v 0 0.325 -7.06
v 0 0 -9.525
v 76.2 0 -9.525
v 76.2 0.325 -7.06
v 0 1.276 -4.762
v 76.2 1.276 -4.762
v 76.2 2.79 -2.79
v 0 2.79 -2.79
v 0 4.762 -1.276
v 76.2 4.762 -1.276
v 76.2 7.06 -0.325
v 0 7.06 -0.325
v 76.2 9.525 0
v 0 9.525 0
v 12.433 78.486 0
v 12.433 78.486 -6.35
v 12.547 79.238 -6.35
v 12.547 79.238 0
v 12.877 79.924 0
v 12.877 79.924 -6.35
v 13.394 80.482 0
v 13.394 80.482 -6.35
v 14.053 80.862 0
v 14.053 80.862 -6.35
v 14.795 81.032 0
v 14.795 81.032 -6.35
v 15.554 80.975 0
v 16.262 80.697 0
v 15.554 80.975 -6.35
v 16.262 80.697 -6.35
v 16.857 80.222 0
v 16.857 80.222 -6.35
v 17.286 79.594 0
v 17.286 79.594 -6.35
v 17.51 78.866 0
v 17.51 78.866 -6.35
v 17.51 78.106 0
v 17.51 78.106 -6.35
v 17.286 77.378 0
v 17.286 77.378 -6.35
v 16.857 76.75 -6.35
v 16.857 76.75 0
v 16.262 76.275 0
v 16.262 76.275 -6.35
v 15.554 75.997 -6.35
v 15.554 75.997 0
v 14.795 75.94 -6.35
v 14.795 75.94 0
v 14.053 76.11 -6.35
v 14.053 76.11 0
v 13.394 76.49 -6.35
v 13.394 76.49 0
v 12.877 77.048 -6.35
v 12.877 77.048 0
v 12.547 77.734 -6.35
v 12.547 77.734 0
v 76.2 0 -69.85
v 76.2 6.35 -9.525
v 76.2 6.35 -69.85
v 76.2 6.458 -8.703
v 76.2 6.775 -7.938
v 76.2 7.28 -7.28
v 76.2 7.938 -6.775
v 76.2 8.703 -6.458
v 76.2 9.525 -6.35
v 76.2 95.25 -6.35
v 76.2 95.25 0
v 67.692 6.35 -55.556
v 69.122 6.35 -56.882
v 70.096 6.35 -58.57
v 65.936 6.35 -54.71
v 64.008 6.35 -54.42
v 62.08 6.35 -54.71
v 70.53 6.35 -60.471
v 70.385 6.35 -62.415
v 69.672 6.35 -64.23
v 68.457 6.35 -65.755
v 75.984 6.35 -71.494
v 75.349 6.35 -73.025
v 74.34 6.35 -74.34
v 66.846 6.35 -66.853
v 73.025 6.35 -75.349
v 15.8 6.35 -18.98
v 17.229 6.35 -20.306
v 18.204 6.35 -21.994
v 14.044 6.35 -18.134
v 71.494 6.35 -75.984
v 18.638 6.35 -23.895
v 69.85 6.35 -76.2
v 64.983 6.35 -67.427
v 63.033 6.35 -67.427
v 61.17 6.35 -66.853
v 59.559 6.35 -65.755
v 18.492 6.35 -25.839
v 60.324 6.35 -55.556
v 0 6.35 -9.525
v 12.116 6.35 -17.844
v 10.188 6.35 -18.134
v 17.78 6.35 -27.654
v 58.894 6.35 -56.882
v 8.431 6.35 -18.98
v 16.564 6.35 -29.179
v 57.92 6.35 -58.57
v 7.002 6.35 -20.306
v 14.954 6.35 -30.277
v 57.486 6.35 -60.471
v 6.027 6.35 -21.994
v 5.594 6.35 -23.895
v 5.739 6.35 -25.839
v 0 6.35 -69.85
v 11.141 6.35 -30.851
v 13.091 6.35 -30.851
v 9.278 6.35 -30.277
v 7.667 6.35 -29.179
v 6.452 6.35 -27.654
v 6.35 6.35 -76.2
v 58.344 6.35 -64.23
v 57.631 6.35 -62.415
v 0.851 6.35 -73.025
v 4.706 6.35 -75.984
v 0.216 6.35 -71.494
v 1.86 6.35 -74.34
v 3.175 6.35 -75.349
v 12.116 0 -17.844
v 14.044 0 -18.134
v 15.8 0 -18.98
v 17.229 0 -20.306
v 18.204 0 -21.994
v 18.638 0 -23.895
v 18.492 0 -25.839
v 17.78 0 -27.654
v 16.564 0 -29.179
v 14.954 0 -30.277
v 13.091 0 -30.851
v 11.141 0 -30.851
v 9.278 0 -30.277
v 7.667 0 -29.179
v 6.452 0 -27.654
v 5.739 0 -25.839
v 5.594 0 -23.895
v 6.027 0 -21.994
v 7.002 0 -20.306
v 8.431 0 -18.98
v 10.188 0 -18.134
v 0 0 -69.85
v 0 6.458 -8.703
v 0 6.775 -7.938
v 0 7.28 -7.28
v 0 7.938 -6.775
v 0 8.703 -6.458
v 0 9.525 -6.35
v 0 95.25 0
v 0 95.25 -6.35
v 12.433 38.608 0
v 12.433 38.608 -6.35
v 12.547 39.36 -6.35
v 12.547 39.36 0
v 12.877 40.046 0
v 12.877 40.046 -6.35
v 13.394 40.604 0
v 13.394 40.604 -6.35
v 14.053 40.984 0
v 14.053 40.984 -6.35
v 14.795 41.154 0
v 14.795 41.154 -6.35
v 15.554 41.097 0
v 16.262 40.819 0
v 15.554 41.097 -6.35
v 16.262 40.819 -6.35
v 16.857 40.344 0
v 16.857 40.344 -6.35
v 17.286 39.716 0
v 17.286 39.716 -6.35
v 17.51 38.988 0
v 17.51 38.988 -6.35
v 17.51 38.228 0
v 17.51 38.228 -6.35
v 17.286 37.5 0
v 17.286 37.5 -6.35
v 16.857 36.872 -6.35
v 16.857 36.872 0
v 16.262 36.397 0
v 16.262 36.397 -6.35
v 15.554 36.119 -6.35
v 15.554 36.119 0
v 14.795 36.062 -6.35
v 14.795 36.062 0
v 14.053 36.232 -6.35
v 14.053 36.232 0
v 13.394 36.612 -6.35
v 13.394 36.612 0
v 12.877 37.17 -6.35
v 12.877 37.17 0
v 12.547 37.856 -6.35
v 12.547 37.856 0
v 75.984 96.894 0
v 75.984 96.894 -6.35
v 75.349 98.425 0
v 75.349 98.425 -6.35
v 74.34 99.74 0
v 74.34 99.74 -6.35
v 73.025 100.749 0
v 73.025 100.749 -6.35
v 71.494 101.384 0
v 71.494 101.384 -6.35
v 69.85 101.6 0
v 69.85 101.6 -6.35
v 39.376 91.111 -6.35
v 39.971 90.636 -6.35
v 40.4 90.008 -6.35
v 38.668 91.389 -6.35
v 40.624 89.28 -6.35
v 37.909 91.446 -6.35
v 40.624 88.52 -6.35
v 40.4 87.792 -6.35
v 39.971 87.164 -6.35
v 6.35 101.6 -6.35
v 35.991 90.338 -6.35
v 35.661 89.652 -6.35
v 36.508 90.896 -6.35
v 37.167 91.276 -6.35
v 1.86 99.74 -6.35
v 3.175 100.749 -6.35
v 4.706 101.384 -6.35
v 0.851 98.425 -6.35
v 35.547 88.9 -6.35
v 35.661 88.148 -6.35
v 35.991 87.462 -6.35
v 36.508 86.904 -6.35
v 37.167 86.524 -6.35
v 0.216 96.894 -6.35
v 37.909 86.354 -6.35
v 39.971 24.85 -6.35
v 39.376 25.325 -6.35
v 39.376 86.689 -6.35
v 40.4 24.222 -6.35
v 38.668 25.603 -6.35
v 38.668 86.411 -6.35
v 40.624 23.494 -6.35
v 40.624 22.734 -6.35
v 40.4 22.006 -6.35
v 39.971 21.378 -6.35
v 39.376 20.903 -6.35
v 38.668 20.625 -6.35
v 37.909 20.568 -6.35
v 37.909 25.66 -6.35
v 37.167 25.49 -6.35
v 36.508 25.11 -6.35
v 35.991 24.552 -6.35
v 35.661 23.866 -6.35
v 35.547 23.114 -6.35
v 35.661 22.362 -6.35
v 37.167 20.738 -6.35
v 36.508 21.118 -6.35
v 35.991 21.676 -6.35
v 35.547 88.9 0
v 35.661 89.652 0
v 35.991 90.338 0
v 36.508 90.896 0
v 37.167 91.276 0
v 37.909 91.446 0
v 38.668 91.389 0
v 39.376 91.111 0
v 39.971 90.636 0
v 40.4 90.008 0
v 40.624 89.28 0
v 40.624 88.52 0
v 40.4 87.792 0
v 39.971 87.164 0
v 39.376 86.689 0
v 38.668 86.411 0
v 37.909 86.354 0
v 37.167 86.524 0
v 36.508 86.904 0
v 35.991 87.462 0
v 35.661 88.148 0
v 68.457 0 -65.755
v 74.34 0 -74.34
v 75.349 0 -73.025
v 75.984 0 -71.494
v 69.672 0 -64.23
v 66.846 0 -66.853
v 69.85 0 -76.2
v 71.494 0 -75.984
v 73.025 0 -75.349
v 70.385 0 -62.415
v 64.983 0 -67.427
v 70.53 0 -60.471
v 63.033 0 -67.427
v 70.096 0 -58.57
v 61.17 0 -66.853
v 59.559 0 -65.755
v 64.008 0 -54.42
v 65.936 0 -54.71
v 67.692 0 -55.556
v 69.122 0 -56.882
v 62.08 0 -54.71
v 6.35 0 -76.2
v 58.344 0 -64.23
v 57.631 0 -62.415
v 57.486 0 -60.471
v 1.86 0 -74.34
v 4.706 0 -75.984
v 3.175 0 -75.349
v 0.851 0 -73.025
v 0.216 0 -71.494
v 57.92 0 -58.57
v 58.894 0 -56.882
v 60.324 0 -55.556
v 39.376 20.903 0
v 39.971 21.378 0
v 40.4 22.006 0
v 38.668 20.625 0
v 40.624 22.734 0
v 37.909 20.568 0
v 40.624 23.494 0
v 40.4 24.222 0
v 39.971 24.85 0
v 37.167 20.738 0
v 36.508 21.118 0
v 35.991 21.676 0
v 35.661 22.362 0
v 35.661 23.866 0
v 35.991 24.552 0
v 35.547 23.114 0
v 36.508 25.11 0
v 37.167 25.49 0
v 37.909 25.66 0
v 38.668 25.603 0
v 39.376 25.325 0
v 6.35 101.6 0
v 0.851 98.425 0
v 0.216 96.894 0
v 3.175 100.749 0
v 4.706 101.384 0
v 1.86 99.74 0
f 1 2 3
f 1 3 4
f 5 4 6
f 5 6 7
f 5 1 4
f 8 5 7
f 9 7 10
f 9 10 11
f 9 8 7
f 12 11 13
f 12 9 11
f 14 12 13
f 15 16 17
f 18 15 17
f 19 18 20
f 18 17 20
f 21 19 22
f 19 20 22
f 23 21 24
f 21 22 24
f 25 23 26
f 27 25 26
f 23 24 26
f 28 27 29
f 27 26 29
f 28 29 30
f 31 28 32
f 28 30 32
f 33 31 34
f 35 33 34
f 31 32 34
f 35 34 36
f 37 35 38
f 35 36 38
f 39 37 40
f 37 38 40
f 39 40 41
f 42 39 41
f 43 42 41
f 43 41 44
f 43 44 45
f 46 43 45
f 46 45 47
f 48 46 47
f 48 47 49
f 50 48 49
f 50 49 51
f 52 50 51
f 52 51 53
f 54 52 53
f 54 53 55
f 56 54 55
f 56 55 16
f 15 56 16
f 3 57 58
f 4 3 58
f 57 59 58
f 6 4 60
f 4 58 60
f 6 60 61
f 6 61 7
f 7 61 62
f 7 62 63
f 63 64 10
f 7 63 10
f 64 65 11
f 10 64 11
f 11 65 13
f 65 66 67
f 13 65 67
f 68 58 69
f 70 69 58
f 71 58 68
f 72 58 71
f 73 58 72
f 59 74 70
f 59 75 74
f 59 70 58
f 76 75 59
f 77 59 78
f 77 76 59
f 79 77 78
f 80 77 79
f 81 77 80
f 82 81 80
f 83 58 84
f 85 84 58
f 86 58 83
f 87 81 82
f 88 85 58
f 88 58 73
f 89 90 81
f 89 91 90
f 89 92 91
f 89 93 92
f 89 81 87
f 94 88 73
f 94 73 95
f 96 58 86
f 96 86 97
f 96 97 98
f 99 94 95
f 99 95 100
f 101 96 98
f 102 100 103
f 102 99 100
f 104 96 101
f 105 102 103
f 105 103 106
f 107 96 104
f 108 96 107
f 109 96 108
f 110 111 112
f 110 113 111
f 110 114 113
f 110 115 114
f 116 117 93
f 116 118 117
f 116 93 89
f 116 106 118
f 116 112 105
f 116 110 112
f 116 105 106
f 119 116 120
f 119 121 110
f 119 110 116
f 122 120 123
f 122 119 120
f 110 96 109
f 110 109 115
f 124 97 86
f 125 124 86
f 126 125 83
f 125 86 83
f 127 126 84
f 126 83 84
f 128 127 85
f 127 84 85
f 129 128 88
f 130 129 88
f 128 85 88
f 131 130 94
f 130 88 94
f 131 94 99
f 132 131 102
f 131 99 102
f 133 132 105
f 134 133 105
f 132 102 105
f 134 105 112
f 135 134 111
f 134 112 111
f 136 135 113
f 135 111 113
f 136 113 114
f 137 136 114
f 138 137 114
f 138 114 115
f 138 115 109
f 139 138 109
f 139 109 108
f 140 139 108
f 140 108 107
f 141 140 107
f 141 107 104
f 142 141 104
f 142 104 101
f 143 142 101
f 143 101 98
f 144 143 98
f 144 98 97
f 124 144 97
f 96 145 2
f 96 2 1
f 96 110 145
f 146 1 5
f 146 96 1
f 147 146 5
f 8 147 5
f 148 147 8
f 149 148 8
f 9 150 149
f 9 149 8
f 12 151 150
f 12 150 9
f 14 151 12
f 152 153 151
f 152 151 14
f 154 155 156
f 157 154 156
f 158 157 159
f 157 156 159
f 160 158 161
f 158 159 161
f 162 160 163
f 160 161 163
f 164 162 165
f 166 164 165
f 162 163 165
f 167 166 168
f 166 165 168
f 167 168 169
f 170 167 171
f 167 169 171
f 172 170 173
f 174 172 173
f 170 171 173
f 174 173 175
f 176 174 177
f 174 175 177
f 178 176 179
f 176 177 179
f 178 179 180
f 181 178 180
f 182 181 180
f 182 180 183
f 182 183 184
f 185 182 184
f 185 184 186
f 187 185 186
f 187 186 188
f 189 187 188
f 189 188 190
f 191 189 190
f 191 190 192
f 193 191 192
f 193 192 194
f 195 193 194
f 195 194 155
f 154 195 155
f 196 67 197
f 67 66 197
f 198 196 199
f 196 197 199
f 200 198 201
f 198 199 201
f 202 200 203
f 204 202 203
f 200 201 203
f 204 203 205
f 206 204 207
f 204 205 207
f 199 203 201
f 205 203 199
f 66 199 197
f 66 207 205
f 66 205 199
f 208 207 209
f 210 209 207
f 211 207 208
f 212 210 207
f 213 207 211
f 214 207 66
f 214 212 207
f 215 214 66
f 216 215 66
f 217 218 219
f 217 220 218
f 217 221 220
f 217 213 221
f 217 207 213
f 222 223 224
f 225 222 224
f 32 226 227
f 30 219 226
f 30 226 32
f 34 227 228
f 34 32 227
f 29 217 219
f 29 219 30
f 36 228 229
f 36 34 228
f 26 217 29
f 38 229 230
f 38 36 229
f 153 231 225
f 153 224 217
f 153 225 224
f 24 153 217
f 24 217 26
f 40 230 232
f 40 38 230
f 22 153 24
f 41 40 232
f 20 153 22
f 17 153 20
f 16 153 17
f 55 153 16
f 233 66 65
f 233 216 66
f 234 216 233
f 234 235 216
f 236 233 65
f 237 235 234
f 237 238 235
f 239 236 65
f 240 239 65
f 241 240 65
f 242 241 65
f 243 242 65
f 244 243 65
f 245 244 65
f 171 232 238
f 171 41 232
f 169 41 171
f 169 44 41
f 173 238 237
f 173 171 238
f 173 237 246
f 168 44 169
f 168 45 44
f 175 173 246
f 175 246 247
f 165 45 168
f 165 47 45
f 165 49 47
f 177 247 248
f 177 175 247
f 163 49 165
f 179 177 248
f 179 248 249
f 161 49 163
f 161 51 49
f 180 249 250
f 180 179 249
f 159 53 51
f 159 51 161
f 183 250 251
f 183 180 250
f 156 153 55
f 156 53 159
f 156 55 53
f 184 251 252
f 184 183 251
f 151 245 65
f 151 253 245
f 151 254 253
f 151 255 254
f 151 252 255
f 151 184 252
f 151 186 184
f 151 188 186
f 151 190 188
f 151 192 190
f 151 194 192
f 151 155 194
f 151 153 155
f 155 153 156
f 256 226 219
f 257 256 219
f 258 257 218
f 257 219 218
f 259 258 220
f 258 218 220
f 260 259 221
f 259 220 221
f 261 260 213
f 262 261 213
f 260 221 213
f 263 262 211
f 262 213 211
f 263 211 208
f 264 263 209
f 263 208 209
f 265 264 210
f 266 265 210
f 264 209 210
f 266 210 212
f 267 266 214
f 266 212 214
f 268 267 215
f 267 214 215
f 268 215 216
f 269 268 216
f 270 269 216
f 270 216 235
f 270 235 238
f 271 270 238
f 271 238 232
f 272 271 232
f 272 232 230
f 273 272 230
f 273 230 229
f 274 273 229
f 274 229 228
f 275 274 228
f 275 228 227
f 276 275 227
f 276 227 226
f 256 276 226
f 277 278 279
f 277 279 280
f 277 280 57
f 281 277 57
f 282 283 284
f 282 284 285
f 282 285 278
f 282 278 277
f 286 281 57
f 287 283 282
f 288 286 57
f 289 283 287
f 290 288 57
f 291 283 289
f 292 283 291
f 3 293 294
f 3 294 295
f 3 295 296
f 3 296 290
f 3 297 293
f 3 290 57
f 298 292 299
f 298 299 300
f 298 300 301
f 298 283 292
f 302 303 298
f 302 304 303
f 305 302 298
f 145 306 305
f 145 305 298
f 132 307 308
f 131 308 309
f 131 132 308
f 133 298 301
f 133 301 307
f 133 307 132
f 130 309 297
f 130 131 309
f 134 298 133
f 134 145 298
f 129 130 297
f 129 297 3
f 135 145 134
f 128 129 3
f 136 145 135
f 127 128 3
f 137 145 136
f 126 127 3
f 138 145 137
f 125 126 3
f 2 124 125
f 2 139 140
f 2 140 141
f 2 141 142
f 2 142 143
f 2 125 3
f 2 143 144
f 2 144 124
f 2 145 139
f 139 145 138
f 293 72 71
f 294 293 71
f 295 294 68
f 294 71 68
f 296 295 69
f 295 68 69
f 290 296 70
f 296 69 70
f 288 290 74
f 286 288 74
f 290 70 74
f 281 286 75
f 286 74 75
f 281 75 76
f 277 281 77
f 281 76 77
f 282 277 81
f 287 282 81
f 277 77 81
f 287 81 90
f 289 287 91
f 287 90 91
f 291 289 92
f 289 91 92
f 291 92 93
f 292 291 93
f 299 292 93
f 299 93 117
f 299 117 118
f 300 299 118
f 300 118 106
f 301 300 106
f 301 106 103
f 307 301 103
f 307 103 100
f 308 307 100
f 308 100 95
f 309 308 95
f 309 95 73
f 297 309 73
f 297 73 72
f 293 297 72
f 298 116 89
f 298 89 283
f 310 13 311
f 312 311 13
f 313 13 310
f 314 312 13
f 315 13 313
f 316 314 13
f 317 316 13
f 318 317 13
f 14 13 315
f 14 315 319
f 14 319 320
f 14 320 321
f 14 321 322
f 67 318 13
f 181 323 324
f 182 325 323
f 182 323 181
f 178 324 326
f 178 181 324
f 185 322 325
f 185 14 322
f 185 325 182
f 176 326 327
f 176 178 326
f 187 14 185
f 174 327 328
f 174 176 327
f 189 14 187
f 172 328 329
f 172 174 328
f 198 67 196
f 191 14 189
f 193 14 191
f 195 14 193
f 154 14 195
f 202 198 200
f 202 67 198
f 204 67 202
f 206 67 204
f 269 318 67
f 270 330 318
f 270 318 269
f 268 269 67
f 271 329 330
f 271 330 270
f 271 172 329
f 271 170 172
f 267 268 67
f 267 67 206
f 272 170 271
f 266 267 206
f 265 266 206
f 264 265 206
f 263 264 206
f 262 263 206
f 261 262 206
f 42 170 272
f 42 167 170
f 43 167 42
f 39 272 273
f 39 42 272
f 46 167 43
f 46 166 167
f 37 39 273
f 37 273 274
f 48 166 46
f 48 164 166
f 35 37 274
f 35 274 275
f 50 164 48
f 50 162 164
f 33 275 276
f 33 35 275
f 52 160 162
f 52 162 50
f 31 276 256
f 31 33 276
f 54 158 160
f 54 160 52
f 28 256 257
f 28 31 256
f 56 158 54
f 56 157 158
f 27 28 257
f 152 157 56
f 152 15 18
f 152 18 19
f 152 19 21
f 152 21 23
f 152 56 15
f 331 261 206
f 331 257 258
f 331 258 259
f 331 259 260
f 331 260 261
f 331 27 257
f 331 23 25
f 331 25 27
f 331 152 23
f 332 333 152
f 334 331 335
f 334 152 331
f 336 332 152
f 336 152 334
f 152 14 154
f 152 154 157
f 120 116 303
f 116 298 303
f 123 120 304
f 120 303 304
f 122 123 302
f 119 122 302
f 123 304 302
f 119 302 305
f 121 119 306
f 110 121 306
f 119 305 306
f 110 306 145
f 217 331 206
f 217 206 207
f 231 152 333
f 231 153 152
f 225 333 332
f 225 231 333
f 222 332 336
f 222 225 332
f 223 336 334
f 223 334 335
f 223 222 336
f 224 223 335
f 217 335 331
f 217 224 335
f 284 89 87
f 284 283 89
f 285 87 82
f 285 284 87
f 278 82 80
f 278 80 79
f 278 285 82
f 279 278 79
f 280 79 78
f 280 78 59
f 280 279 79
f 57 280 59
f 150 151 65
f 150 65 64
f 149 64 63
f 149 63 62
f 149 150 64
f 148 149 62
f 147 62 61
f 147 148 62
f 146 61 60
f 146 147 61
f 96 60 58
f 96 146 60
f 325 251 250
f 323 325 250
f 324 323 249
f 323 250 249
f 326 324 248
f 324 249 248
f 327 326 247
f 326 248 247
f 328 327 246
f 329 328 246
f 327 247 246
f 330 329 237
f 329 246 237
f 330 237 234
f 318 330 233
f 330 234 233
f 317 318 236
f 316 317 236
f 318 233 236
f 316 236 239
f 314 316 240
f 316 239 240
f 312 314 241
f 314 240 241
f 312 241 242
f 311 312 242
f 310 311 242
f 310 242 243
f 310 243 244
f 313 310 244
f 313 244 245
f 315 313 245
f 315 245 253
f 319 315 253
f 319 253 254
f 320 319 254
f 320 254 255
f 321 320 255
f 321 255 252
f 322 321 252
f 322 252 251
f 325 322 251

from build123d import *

# Parameters (mm, degrees)
BASE_FLANGE1_DEPTH = 76.2
SKETCH3_R          = 6.5405
TAB1_DEPTH         = 6.35
SKETCH3_2_R        = 6.5405
CUT_EXTRUDE1_DEPTH = 12.7
SKETCH4_R          = 2.5527
CUT_EXTRUDE2_DEPTH = 12.7
FILLET1_R          = 6.35


# Sheet-metal steps are written as plain solids
with BuildPart() as part:
    # Sketch1 → Base-Flange1 (new body)
    with BuildSketch(Plane(origin=(0, 0, 0), x_dir=(0, 0, -1), z_dir=(1, 0, 0))):
        with BuildLine():
            Line((76.2, 0), (9.525, 0))
            ThreePointArc((9.525, 0), (2.789807909, 2.789807909), (0, 9.525))
            Line((0, 9.525), (0, 101.6))
            Line((0, 101.6), (6.35, 101.6))
            Line((6.35, 101.6), (6.35, 9.525))
            ThreePointArc((6.35, 9.525), (7.27993597, 7.27993597), (9.525, 6.35))
            Line((9.525, 6.35), (76.2, 6.35))
            Line((76.2, 6.35), (76.2, 0))
        make_face()
    extrude(amount=BASE_FLANGE1_DEPTH)

    # Sketch3 → Tab1 (add)
    with BuildSketch(Plane(origin=(0, 6.35, 0), x_dir=(-1, 0, 0), z_dir=(0, 1, 0))):
        with Locations((-12.1158, -24.384)):
            Circle(SKETCH3_R)
        with Locations((-64.008, -60.96)):
            Circle(SKETCH3_R)
    extrude(amount=-TAB1_DEPTH)

    # Sketch3<2> → Cut-Extrude1 (cut)
    with BuildSketch(Plane(origin=(0, 6.35, 0), x_dir=(-1, 0, 0), z_dir=(0, 1, 0))):
        with Locations(Location((-12.1158, -24.384, 0), (0, 0, 90))):
            Circle(SKETCH3_2_R)
        with Locations(Location((-64.008, -60.96, 0), (0, 0, 90))):
            Circle(SKETCH3_2_R)
    extrude(amount=-CUT_EXTRUDE1_DEPTH, mode=Mode.SUBTRACT)

    # Sketch4 → Cut-Extrude2 (cut)
    with BuildSketch(Plane(origin=(0, 0, -6.35), x_dir=(-1, 0, 0), z_dir=(0, 0, -1))):
        with Locations((-38.1, 88.9)):
            Circle(SKETCH4_R)
        with Locations((-38.1, 23.114)):
            Circle(SKETCH4_R)
        with Locations((-14.986, 78.486)):
            Circle(SKETCH4_R)
        with Locations((-14.986, 38.608)):
            Circle(SKETCH4_R)
    extrude(amount=-CUT_EXTRUDE2_DEPTH, mode=Mode.SUBTRACT)

    # Fillet1
    fillet1_edges = [part.edges().sort_by_distance(p)[0] for p in [
        (76.2, 101.6, -3.175),
        (0, 101.6, -3.175),
        (76.2, 3.175, -76.2),
        (0, 3.175, -76.2),
    ]]
    fillet(fillet1_edges, radius=FILLET1_R)


solid = part.part
